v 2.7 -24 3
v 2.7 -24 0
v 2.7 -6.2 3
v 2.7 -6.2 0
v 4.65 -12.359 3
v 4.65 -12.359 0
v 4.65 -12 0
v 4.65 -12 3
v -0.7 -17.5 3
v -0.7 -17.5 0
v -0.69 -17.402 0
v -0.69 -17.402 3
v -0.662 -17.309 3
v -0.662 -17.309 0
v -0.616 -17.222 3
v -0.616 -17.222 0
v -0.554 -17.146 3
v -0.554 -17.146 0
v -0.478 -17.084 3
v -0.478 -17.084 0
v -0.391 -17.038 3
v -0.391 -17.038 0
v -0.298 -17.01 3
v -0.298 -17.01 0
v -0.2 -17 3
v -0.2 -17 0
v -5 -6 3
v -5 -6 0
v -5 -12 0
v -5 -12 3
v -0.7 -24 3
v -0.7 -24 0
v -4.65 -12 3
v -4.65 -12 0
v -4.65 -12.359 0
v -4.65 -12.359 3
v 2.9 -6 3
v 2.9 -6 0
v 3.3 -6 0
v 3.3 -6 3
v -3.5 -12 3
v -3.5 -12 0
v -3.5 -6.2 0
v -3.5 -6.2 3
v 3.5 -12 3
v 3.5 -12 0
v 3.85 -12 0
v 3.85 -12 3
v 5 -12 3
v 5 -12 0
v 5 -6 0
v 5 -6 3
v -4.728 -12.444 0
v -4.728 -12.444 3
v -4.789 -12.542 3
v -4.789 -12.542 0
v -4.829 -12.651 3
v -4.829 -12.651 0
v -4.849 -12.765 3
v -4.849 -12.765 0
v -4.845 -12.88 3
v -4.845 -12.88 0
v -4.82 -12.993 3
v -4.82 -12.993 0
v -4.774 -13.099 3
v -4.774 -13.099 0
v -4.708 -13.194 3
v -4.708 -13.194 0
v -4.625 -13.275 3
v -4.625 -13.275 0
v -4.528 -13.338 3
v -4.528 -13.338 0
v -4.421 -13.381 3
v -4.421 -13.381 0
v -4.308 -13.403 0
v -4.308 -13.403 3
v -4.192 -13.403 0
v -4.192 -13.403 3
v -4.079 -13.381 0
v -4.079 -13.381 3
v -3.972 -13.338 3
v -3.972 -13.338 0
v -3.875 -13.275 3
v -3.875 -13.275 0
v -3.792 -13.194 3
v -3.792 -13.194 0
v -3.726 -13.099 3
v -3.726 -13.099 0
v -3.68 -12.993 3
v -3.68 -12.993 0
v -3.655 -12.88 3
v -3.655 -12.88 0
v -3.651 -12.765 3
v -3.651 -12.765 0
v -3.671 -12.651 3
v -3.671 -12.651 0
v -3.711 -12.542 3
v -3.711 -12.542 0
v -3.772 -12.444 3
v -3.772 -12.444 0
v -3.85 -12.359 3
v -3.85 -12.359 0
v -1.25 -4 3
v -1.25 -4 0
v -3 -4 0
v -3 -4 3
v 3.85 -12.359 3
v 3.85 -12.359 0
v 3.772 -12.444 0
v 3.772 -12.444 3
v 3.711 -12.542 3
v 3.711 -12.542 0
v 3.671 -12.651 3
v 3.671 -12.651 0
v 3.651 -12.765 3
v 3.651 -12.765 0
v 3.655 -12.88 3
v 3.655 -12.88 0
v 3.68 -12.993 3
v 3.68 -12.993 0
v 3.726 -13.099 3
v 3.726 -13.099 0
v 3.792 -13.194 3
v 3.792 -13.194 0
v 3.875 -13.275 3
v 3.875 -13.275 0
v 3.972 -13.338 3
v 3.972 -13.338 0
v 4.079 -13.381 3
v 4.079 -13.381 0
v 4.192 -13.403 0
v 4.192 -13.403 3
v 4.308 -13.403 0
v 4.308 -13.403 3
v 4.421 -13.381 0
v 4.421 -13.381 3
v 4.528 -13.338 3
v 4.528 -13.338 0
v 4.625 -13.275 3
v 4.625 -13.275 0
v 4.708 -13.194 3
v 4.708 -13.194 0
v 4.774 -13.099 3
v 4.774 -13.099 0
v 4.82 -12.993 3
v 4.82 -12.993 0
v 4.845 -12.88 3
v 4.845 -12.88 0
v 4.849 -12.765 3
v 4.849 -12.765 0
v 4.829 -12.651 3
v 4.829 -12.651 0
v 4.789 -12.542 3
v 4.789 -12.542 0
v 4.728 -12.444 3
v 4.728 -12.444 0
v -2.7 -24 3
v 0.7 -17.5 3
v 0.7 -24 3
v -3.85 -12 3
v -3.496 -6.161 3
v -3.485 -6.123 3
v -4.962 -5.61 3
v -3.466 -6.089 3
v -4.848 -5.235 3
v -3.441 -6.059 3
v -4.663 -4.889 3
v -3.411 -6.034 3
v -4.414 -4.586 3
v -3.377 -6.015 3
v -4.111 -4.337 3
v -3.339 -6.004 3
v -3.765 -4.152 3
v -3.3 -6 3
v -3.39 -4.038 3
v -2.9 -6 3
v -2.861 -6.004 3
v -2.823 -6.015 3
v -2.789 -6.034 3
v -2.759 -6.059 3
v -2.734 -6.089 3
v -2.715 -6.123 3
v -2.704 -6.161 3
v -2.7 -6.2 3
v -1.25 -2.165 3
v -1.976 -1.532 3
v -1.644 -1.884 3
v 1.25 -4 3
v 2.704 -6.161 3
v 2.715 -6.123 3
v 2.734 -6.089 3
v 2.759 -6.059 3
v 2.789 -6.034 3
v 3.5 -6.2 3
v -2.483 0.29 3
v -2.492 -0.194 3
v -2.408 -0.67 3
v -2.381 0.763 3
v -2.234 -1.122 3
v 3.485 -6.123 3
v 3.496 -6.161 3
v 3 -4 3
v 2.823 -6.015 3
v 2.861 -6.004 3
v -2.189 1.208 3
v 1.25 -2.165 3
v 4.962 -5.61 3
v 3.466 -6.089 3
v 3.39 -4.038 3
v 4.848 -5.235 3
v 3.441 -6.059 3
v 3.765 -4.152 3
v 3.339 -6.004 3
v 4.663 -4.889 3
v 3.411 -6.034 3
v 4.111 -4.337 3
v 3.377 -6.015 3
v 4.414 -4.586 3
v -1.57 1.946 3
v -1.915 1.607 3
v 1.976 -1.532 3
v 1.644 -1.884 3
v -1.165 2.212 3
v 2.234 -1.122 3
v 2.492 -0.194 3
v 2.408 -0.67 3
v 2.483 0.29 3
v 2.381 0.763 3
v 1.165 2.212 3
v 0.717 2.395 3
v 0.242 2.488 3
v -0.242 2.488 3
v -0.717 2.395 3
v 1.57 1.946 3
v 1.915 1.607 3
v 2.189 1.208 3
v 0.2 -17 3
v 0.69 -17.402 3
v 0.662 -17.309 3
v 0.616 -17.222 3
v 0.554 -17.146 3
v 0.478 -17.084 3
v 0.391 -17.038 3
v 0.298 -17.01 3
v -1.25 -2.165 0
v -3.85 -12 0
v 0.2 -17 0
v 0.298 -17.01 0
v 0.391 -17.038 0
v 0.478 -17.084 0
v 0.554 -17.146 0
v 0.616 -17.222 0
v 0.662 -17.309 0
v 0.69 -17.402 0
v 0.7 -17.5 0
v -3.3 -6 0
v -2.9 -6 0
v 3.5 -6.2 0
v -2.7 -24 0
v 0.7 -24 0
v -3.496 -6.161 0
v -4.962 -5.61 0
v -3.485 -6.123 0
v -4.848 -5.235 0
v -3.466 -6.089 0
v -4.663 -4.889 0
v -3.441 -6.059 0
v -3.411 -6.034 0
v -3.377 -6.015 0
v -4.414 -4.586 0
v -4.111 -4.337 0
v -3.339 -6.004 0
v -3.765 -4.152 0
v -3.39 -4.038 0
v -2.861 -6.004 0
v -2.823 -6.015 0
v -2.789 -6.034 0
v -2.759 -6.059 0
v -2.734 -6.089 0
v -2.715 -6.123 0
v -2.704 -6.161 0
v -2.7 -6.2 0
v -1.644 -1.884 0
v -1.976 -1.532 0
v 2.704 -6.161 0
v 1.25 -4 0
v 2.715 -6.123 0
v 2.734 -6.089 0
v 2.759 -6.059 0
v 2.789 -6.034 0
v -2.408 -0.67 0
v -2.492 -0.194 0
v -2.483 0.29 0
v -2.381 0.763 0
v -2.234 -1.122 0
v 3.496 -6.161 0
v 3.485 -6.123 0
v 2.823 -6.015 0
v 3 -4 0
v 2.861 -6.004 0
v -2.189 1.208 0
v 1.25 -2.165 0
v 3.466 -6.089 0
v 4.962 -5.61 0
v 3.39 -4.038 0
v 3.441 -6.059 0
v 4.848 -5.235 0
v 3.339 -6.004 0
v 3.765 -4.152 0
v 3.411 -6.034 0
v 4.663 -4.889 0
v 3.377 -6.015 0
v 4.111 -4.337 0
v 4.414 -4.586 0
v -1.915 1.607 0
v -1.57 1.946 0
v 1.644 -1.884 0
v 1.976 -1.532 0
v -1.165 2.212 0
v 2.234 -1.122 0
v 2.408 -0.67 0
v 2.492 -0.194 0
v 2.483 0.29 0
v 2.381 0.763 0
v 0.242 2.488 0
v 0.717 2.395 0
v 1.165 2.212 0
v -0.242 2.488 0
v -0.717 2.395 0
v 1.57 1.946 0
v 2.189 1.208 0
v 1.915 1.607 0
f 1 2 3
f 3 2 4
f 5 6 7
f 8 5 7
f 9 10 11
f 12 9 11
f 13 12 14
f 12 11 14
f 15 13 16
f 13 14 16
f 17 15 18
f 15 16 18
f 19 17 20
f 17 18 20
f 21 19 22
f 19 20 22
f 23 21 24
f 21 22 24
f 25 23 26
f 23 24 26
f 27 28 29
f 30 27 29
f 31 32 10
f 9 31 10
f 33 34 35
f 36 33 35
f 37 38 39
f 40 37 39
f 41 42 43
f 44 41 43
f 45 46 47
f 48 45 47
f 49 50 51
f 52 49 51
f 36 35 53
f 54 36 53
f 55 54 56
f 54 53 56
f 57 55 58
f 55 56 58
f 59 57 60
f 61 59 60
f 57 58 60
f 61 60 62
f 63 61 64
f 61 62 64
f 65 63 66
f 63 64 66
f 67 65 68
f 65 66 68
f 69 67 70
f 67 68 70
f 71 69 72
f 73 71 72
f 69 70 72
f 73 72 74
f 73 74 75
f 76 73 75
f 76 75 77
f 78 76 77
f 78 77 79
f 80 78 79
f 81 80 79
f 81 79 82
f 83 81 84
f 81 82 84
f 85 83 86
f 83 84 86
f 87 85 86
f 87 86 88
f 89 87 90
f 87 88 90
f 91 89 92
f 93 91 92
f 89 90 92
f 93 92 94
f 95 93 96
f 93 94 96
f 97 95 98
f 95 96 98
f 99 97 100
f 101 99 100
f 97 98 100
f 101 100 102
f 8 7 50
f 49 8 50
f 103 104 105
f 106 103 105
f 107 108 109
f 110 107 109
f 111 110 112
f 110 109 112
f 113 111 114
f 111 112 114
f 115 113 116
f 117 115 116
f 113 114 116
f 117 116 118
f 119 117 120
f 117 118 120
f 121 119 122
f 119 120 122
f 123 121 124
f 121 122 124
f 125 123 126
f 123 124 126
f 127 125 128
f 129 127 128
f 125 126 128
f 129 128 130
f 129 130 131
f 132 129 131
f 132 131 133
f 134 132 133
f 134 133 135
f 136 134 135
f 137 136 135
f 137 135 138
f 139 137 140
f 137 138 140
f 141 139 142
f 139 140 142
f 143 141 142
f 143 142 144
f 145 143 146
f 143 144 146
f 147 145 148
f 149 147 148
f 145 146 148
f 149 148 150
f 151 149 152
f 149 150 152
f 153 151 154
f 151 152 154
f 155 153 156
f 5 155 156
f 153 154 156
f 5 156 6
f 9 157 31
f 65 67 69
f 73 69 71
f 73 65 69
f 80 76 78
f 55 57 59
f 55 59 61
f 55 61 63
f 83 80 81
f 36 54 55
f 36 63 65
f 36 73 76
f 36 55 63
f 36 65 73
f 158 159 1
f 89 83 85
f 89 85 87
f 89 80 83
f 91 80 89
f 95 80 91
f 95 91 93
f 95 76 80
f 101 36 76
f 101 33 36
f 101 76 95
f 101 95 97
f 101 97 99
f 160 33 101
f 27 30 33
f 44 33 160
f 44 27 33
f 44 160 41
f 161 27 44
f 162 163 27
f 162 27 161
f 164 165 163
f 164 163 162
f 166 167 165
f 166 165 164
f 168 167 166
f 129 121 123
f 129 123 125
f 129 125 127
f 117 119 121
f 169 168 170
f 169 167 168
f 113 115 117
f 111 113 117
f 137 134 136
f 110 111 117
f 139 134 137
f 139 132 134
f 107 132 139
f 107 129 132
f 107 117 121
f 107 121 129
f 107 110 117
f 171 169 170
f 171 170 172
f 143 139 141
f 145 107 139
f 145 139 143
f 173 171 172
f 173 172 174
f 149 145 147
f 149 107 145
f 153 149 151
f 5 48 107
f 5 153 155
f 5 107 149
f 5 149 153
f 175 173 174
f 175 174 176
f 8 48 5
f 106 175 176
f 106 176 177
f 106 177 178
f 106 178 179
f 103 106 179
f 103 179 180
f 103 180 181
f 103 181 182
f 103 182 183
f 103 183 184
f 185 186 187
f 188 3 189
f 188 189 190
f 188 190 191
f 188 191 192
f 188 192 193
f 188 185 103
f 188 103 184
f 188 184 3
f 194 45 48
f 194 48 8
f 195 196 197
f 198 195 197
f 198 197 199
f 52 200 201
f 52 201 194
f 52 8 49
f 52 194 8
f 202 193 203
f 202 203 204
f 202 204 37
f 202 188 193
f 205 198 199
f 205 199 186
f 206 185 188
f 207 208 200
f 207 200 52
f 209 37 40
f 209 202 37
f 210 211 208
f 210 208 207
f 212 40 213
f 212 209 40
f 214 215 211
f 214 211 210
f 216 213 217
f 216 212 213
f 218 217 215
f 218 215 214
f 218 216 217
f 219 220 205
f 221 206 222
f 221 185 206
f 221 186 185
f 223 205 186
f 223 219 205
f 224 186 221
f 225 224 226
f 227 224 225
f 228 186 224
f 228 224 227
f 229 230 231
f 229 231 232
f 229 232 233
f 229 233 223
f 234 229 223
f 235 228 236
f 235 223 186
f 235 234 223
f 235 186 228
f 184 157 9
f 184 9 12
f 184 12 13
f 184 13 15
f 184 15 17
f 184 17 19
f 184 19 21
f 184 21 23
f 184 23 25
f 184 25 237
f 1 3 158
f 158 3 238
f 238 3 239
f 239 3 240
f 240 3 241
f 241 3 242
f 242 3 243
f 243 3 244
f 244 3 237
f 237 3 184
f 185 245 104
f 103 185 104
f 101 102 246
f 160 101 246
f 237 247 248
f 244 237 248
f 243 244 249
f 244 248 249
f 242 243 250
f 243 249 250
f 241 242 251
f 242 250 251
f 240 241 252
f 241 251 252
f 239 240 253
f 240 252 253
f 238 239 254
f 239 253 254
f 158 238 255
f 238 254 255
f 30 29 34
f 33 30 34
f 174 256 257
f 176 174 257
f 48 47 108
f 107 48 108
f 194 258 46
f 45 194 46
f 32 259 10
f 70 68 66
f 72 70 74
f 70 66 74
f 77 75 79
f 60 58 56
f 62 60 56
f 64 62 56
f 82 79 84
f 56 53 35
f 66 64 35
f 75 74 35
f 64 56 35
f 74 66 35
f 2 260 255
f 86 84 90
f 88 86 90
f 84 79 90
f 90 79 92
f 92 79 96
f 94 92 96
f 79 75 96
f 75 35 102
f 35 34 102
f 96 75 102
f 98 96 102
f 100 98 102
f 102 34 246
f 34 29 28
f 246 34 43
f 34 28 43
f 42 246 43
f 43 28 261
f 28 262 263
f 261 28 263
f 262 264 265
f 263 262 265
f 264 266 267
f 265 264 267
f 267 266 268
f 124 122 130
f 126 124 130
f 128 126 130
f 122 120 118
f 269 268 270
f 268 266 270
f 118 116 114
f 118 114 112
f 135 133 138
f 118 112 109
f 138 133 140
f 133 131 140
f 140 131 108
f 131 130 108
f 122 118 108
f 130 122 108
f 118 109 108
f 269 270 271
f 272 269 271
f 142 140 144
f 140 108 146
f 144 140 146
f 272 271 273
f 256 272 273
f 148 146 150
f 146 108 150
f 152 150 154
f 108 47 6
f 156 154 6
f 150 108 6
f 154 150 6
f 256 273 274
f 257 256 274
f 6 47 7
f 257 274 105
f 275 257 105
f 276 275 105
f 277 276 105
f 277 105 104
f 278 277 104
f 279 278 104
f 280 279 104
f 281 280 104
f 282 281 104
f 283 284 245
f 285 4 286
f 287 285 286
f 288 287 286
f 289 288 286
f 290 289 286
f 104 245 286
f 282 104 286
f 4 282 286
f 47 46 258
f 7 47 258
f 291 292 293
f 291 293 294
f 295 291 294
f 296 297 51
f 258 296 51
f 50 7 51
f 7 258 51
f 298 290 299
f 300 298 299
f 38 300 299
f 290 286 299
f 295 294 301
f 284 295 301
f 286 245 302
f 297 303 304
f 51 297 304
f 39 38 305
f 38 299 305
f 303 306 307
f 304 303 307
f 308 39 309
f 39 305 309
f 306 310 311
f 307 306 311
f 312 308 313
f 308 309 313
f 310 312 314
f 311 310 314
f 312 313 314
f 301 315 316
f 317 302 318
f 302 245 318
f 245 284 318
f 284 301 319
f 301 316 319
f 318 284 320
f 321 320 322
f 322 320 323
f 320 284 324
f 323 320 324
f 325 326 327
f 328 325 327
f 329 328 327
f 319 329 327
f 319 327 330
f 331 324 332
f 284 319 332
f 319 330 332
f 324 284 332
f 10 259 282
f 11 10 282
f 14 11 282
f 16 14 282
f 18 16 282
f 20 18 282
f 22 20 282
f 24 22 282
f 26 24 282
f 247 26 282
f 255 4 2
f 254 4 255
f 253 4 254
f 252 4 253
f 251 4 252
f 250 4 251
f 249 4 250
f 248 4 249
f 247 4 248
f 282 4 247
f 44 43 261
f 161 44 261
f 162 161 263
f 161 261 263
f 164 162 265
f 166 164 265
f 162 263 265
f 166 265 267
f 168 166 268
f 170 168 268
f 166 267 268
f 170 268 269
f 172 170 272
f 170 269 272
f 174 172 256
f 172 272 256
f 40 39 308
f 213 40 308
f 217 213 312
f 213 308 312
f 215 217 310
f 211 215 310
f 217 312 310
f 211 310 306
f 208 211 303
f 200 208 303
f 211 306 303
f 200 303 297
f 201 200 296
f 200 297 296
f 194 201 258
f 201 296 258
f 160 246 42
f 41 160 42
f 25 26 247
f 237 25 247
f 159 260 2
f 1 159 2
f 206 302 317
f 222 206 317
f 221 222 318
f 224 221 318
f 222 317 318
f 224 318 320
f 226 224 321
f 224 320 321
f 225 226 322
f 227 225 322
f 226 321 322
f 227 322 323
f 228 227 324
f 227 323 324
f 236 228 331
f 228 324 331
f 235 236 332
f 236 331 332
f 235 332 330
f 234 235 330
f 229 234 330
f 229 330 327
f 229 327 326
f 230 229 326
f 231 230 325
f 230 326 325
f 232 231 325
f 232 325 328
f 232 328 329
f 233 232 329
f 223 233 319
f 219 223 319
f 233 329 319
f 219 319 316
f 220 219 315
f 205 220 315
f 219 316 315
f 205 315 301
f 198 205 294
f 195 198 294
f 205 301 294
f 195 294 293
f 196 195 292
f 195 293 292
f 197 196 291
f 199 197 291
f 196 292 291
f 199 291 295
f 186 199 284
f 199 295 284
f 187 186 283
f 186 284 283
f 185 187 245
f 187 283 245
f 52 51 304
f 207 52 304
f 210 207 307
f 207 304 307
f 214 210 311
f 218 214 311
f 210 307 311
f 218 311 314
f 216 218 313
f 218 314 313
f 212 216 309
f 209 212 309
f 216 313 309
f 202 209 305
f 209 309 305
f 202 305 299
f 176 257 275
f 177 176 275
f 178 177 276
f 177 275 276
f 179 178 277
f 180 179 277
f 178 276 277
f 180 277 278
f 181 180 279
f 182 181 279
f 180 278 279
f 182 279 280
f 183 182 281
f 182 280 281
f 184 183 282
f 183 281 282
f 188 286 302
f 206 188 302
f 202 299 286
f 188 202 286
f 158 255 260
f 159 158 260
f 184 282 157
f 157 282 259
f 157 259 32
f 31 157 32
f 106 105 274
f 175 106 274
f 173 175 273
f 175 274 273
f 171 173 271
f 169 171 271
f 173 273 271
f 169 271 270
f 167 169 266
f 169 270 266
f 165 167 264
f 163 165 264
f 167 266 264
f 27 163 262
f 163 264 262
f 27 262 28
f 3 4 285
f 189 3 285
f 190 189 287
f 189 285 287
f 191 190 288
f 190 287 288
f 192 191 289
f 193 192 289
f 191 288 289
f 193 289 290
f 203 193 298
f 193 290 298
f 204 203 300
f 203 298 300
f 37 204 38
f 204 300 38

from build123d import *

# Parameters (mm, degrees)
F1_DEPTH = 3


with BuildPart() as f1:
    # F0 (on Top) → F1 (new body)
    with BuildSketch(Plane.XY):
        with BuildLine():
            Line((1.25, -4), (1.25, -2.165064))
            ThreePointArc((1.25, -2.165064), (0, 2.5), (-1.25, -2.165064))
            Line((-1.25, -2.165064), (-1.25, -4))
            Line((-1.25, -4), (-3, -4))
            ThreePointArc((-3, -4), (-4.414214, -4.585786), (-5, -6))
            Line((-5, -6), (-5, -12))
            Line((-5, -12), (-4.65, -12))
            Line((-4.65, -12), (-4.65, -12.359054))
            ThreePointArc((-4.65, -12.359054), (-4.25, -13.406267), (-3.85, -12.359054))
            Line((-3.85, -12.359054), (-3.85, -12))
            Line((-3.85, -12), (-3.5, -12))
            Line((-3.5, -12), (-3.5, -6.2))
            ThreePointArc((-3.5, -6.2), (-3.441421, -6.058579), (-3.3, -6))
            Line((-3.3, -6), (-2.9, -6))
            ThreePointArc((-2.9, -6), (-2.758579, -6.058579), (-2.7, -6.2))
            Line((-2.7, -6.2), (-2.7, -24))
            Line((-2.7, -24), (-0.7, -24))
            Line((-0.7, -24), (-0.7, -17.5))
            ThreePointArc((-0.7, -17.5), (-0.553553, -17.146447), (-0.2, -17))
            Line((-0.2, -17), (0, -17))
            Line((0, -17), (0.2, -17))
            ThreePointArc((0.2, -17), (0.553553, -17.146447), (0.7, -17.5))
            Line((0.7, -17.5), (0.7, -24))
            Line((0.7, -24), (2.7, -24))
            Line((2.7, -24), (2.7, -6.2))
            ThreePointArc((2.7, -6.2), (2.758579, -6.058579), (2.9, -6))
            Line((2.9, -6), (3.3, -6))
            ThreePointArc((3.3, -6), (3.441421, -6.058579), (3.5, -6.2))
            Line((3.5, -6.2), (3.5, -12))
            Line((3.5, -12), (3.85, -12))
            Line((3.85, -12), (3.85, -12.359054))
            ThreePointArc((3.85, -12.359054), (4.25, -13.406267), (4.65, -12.359054))
            Line((4.65, -12.359054), (4.65, -12))
            Line((4.65, -12), (5, -12))
            Line((5, -12), (5, -6))
            ThreePointArc((5, -6), (4.414214, -4.585786), (3, -4))
            Line((3, -4), (1.25, -4))
        make_face()
    extrude(amount=F1_DEPTH)


solid = f1.part
